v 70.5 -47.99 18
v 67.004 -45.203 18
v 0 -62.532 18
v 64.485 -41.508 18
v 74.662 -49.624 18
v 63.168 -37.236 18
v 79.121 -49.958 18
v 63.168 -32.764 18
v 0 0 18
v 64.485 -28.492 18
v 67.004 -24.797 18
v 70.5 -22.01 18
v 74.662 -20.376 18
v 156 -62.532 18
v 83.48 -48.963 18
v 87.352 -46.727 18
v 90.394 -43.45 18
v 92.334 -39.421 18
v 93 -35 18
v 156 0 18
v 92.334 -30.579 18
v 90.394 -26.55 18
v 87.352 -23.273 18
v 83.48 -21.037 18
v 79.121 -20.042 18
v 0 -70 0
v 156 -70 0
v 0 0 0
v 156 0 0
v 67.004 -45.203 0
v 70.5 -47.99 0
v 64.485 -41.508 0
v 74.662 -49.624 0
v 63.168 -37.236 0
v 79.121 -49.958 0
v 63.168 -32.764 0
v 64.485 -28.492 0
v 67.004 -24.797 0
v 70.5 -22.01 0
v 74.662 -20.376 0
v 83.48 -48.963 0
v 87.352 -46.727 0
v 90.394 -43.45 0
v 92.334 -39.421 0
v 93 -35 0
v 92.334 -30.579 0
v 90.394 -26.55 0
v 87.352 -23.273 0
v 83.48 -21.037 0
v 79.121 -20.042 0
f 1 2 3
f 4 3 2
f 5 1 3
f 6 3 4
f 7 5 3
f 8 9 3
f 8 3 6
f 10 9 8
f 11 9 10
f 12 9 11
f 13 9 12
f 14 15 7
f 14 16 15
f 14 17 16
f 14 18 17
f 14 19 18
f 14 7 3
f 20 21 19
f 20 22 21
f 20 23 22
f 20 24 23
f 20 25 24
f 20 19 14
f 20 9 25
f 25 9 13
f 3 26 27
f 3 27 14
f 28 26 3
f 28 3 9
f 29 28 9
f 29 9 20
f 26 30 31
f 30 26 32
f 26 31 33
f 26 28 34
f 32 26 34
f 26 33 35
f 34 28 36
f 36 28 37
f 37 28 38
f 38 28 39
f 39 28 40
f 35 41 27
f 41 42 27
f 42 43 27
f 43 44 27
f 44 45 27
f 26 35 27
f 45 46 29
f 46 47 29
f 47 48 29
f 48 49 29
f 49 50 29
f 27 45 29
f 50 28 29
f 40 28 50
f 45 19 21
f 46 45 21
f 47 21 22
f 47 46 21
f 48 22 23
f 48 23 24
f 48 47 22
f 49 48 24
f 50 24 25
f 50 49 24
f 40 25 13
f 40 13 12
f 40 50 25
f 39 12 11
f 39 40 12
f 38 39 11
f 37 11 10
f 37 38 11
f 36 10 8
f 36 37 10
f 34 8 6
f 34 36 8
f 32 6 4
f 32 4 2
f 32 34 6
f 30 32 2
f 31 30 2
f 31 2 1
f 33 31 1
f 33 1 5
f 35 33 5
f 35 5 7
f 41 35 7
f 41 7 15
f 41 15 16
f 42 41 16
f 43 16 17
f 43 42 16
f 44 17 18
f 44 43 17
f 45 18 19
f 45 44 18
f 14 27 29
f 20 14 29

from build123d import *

# Parameters (mm, degrees)
F0_W     = 156
F0_H     = 70
F0_R     = 15
F1_DEPTH = 18
F3_DEPTH = 156


with BuildPart() as f1:
    # F0 (on Top) → F1 (new body)
    with BuildSketch(Plane.XY):
        with Locations((78, -35)):
            Rectangle(F0_W, F0_H)
        with Locations((78, -35)):
            Circle(F0_R, mode=Mode.SUBTRACT)
    extrude(amount=F1_DEPTH)

    # F2 (on Right) → F3 (cut)
    with BuildSketch(Plane.YZ):
        Polygon((-70, 18), (-70, 0), (-62.531915, 18), align=None)
    extrude(amount=F3_DEPTH, mode=Mode.SUBTRACT)


solid = f1.part
